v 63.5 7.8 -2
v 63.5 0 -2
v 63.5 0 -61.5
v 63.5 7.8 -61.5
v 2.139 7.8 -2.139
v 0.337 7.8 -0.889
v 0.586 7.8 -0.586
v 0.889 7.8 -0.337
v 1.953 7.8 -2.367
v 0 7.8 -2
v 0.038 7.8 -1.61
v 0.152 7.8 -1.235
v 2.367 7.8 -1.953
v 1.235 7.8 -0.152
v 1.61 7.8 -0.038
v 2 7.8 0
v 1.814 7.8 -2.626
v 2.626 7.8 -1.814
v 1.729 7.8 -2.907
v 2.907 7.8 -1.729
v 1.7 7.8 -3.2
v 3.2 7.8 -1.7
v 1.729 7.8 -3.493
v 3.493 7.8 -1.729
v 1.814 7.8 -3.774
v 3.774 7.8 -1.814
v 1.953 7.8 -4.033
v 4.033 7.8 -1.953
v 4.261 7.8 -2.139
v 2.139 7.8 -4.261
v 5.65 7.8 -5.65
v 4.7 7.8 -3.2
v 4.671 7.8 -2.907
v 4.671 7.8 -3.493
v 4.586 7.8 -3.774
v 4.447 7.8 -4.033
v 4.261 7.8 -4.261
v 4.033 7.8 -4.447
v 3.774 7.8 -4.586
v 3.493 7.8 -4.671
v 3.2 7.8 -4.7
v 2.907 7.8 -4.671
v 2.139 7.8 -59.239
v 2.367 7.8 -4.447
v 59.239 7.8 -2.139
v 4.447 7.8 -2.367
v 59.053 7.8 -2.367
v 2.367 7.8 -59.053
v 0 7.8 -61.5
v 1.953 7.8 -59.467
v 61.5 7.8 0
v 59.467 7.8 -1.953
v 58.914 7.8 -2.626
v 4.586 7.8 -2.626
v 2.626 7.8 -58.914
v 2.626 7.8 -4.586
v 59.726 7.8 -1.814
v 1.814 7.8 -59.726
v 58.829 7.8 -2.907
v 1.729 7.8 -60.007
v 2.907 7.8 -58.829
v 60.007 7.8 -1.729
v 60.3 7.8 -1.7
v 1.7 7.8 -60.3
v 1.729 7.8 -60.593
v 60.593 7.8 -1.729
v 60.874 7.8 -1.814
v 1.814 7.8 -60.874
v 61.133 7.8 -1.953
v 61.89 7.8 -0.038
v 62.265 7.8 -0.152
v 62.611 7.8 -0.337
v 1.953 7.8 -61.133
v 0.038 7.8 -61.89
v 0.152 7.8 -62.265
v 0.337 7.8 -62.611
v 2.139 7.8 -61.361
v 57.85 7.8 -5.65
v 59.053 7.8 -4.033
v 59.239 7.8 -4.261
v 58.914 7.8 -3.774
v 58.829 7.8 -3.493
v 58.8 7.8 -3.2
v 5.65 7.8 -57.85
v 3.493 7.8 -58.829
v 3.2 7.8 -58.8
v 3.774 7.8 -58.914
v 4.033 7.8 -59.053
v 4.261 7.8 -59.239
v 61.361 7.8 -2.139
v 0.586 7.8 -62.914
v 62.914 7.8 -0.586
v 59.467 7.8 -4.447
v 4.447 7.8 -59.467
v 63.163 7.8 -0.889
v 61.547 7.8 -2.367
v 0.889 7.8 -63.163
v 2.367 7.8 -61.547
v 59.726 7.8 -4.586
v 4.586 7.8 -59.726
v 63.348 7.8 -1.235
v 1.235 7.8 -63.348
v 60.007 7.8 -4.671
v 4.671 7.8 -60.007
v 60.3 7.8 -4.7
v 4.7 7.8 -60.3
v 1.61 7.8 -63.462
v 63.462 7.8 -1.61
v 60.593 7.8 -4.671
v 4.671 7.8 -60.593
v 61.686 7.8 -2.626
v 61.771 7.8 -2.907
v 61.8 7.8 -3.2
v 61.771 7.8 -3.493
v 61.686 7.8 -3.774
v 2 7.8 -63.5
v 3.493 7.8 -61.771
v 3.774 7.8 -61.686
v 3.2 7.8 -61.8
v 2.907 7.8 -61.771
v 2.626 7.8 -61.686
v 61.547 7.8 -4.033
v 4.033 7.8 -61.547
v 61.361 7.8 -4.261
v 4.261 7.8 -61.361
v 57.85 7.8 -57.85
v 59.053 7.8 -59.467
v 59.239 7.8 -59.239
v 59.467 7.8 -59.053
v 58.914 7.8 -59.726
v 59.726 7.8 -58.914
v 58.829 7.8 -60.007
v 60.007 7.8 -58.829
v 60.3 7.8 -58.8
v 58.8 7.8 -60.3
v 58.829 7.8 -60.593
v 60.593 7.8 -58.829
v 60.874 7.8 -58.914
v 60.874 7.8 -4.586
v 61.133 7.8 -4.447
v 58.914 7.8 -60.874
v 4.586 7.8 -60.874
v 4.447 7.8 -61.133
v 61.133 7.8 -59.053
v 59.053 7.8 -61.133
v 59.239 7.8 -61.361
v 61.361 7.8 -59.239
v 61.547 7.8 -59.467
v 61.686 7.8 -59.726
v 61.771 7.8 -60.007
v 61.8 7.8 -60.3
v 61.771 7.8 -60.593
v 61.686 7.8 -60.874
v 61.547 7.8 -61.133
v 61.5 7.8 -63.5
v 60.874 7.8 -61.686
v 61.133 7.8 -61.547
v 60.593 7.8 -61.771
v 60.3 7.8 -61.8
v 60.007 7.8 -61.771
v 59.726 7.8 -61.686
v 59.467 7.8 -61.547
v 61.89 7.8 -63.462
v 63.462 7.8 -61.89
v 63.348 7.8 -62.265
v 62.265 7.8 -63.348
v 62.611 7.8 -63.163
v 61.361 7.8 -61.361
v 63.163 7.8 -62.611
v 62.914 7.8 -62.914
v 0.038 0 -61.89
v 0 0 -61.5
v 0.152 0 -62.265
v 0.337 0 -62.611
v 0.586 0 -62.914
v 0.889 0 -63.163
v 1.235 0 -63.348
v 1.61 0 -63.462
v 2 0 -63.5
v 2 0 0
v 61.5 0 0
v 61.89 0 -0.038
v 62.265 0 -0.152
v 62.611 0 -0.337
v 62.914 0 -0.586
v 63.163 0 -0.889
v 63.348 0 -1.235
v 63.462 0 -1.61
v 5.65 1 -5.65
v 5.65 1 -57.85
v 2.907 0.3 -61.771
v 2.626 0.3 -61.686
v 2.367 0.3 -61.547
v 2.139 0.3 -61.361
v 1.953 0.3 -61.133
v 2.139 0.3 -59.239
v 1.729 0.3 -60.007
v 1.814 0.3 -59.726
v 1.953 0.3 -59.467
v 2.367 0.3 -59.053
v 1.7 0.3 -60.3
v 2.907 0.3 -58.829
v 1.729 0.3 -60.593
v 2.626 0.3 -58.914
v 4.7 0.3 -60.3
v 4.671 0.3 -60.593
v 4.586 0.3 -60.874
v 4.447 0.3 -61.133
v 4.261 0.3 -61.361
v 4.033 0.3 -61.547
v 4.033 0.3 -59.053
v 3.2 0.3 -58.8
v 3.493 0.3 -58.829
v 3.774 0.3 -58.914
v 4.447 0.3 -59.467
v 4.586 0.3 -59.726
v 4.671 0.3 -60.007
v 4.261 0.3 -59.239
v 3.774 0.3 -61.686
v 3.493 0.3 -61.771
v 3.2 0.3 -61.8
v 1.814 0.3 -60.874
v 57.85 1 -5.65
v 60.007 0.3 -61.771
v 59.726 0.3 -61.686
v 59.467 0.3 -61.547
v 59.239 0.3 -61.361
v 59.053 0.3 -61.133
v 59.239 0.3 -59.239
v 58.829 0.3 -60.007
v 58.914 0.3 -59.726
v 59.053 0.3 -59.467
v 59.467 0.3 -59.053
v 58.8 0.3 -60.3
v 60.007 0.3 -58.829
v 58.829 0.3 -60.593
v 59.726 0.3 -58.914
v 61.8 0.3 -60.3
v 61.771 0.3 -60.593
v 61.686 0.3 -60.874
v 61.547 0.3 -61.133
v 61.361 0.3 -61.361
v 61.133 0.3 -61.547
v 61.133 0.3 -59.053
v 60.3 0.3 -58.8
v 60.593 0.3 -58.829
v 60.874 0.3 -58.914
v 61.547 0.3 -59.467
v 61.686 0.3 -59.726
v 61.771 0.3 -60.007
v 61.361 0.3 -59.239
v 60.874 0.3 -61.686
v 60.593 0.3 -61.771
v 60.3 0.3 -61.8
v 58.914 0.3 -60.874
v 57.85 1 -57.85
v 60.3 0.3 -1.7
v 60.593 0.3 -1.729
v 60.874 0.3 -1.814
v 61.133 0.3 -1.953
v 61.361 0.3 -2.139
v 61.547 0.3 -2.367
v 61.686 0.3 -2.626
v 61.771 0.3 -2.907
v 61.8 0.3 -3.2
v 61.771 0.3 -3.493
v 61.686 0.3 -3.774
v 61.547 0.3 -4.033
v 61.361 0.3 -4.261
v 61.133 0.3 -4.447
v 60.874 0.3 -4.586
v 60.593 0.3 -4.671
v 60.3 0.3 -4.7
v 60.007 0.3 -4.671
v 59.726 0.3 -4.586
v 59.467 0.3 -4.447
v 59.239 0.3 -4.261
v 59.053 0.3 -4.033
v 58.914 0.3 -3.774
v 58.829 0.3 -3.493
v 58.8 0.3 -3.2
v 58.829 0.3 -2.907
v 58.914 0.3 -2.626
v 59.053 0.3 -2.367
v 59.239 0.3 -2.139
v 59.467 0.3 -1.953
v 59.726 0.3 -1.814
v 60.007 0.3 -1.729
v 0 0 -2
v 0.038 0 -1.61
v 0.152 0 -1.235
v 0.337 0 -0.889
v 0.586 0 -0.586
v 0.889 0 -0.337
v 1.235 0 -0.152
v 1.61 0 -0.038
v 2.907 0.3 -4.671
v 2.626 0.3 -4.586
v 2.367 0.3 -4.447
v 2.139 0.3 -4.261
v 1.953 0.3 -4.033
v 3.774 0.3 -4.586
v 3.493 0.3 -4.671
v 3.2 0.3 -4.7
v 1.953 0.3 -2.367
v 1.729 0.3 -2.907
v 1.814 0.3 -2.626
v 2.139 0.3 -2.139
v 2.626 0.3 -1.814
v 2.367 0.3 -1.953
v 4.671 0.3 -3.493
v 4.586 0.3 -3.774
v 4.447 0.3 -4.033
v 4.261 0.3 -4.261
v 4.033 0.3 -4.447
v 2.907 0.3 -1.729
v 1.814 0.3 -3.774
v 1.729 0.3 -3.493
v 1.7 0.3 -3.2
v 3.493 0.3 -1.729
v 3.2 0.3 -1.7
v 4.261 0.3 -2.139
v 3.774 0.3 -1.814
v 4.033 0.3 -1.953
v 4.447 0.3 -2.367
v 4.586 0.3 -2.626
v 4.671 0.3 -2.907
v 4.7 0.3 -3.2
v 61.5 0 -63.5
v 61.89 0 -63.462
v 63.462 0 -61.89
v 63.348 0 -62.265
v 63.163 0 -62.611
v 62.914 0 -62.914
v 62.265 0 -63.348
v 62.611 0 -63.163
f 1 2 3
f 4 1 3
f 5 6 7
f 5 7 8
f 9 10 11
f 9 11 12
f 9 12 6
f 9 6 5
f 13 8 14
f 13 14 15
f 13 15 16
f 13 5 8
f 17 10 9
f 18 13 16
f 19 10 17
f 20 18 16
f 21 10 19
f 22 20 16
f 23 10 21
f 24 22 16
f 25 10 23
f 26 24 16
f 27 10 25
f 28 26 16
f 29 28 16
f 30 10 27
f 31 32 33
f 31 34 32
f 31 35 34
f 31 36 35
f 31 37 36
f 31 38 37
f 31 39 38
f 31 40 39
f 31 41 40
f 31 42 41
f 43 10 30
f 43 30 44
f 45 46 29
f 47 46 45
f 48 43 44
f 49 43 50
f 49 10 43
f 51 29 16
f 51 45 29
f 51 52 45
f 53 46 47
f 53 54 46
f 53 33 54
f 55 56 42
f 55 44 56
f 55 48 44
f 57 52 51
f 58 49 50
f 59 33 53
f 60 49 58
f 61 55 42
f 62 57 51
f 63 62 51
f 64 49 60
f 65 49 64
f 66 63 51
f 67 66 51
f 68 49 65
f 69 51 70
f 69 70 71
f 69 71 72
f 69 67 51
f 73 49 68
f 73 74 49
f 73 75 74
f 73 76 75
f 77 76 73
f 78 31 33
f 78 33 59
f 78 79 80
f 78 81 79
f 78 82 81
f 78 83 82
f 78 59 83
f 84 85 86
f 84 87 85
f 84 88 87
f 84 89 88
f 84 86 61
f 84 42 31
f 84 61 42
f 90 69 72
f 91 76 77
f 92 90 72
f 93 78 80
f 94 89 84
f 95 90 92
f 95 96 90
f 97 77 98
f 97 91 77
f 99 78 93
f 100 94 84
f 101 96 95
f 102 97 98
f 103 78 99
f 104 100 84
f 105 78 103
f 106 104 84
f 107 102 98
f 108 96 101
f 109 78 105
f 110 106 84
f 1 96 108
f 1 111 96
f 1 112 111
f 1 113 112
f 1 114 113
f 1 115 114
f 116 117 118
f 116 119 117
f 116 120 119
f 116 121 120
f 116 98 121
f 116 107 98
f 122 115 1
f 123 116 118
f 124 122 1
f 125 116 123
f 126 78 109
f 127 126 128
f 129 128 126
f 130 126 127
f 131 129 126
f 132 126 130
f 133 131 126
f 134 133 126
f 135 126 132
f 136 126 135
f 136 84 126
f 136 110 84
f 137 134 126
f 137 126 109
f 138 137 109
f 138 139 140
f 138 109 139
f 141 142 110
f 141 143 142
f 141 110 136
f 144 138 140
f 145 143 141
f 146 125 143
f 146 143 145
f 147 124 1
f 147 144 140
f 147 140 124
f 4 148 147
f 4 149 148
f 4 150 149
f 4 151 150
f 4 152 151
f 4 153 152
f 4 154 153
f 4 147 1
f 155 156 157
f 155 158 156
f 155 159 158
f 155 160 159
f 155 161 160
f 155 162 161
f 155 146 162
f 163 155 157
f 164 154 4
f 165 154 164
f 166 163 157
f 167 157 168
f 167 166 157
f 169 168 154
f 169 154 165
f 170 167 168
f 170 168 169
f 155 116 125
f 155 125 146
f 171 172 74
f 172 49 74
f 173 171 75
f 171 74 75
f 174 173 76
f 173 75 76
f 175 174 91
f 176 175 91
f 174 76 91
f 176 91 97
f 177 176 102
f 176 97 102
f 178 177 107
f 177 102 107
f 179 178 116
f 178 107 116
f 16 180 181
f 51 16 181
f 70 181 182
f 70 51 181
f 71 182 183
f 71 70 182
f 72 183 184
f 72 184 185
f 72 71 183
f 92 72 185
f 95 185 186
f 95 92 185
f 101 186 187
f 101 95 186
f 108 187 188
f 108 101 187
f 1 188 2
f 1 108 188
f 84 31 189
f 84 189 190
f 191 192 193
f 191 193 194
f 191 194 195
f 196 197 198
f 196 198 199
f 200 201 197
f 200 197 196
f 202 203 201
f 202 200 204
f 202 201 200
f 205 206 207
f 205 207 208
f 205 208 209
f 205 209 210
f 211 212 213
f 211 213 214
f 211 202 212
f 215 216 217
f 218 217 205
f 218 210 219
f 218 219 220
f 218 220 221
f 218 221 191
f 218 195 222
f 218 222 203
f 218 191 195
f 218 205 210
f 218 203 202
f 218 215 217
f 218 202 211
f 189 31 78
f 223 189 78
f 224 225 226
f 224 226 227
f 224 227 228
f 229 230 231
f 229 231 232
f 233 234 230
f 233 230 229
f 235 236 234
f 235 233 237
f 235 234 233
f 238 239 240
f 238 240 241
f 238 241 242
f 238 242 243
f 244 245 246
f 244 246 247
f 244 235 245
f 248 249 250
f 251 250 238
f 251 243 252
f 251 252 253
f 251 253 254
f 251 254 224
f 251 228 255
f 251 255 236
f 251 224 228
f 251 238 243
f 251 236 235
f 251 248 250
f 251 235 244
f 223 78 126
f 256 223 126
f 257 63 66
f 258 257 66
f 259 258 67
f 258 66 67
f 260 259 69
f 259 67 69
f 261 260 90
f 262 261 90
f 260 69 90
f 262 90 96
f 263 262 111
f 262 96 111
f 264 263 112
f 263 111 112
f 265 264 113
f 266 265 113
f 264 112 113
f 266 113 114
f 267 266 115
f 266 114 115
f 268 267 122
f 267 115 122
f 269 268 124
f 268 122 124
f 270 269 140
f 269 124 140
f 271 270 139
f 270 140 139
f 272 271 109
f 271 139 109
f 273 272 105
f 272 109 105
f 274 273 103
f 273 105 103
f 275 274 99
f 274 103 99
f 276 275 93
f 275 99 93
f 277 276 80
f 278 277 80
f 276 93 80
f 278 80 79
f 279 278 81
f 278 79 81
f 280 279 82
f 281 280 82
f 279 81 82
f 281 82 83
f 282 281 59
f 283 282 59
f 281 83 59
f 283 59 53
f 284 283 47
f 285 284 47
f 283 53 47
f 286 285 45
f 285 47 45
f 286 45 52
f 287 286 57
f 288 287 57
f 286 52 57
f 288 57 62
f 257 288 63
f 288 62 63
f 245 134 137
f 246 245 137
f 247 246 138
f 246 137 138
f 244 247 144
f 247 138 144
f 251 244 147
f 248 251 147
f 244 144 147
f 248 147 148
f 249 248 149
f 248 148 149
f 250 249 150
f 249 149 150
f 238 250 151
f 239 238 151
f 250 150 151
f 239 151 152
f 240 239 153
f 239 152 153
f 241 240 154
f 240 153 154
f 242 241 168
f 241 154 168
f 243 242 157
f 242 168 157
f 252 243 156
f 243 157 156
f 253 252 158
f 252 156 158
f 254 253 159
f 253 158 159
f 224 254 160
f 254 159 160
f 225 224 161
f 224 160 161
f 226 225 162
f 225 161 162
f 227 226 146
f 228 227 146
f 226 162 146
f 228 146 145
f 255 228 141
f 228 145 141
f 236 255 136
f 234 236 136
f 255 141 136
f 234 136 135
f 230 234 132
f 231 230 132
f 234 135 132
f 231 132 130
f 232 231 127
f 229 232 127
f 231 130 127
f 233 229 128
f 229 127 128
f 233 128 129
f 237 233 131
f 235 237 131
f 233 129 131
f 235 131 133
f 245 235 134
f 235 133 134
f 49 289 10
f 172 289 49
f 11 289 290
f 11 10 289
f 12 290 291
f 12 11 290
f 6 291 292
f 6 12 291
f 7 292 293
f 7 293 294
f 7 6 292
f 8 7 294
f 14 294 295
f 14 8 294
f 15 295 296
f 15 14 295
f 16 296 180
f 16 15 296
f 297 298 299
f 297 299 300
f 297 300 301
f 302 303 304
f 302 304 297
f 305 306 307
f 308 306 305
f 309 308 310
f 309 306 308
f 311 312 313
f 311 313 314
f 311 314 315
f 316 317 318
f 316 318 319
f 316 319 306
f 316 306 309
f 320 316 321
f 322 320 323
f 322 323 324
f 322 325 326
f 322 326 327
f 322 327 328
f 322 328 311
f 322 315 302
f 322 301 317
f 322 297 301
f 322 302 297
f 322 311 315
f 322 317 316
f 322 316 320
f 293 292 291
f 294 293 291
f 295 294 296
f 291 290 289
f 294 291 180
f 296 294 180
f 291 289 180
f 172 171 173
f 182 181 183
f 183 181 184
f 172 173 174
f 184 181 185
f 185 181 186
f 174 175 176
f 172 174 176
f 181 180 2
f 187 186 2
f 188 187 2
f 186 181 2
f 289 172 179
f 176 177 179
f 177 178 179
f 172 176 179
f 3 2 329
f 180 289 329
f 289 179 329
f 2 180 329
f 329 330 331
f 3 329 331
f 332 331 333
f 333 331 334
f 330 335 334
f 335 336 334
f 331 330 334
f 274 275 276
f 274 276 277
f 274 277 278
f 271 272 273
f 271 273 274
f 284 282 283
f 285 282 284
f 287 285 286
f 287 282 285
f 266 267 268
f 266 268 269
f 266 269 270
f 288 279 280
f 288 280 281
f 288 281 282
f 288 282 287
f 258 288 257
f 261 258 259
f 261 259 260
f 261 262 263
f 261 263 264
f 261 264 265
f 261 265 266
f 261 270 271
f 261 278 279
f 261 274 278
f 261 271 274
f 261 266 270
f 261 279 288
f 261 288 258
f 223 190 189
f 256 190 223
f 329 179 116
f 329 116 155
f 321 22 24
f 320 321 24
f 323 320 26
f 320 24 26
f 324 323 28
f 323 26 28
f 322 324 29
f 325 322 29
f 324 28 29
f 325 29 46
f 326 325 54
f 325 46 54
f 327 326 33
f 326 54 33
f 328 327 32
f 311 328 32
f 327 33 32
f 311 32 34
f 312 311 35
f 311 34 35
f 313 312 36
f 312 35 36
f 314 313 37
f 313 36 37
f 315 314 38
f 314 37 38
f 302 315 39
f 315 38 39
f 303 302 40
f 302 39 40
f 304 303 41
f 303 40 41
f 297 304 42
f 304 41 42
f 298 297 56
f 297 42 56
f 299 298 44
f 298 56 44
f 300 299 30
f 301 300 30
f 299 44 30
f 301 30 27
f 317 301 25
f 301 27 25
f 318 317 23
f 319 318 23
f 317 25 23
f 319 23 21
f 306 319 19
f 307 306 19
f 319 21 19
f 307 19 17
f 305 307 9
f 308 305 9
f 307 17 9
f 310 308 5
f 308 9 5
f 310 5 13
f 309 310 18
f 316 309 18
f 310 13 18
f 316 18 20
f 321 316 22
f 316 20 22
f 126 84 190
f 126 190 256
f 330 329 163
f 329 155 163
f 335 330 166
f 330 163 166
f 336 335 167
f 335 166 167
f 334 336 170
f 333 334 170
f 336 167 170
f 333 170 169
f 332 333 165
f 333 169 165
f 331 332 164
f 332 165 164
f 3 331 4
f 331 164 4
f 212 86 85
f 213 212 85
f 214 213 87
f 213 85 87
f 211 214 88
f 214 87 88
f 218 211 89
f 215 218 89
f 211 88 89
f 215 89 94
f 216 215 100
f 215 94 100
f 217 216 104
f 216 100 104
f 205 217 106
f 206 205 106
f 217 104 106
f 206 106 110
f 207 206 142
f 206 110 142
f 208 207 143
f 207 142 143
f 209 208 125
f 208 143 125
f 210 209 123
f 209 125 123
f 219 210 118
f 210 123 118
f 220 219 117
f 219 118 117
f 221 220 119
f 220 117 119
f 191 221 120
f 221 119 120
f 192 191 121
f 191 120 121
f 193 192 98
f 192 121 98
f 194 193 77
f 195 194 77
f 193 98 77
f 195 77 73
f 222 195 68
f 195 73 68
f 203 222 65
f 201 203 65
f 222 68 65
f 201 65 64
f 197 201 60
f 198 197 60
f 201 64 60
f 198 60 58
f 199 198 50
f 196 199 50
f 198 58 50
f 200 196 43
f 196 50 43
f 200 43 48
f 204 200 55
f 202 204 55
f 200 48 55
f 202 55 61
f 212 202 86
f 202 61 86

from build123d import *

# Parameters (mm, degrees)
SKETCH1_W           = 63.5
SKETCH1_H           = 63.5
BOSS_EXTRUDE1_DEPTH = 7.8
SKETCH2_W           = 52.2
SKETCH2_H           = 52.2
CUT_EXTRUDE1_DEPTH  = 6.8
SKETCH3_R           = 1.5
CUT_EXTRUDE2_DEPTH  = 7.5
FILLET1_R           = 2


with BuildPart() as part:
    # Sketch1 → Boss-Extrude1 (new body)
    with BuildSketch(Plane(origin=(0, 0, 0), x_dir=(1, 0, 0), z_dir=(0, 1, 0))):
        with Locations((31.75, 31.75)):
            Rectangle(SKETCH1_W, SKETCH1_H)
    extrude(amount=BOSS_EXTRUDE1_DEPTH)

    # Sketch2 → Cut-Extrude1 (cut)
    with BuildSketch(Plane(origin=(0, 7.8, 0), x_dir=(1, 0, 0), z_dir=(0, 1, 0))):
        with Locations((31.75, 31.75)):
            Rectangle(SKETCH2_W, SKETCH2_H)
    extrude(amount=-CUT_EXTRUDE1_DEPTH, mode=Mode.SUBTRACT)

    # Sketch3 → Cut-Extrude2 (cut)
    with BuildSketch(Plane(origin=(0, 7.8, 0), x_dir=(1, 0, 0), z_dir=(0, 1, 0))):
        with Locations(Location((3.2, 3.2, 0), (0, 0, 270))):
            Circle(SKETCH3_R)
        with Locations(Location((3.2, 60.3, 0), (0, 0, 270))):
            Circle(SKETCH3_R)
        with Locations(Location((60.3, 60.3, 0), (0, 0, 270))):
            Circle(SKETCH3_R)
        with Locations(Location((60.3, 3.2, 0), (0, 0, 270))):
            Circle(SKETCH3_R)
    extrude(amount=-CUT_EXTRUDE2_DEPTH, mode=Mode.SUBTRACT)

    # Fillet1
    fillet1_edges = [part.edges().sort_by_distance(p)[0] for p in [
        (0, 3.9, -63.5),
        (63.5, 3.9, -63.5),
        (63.5, 3.9, 0),
        (0, 3.9, 0),
    ]]
    fillet(fillet1_edges, radius=FILLET1_R)


solid = part.part
